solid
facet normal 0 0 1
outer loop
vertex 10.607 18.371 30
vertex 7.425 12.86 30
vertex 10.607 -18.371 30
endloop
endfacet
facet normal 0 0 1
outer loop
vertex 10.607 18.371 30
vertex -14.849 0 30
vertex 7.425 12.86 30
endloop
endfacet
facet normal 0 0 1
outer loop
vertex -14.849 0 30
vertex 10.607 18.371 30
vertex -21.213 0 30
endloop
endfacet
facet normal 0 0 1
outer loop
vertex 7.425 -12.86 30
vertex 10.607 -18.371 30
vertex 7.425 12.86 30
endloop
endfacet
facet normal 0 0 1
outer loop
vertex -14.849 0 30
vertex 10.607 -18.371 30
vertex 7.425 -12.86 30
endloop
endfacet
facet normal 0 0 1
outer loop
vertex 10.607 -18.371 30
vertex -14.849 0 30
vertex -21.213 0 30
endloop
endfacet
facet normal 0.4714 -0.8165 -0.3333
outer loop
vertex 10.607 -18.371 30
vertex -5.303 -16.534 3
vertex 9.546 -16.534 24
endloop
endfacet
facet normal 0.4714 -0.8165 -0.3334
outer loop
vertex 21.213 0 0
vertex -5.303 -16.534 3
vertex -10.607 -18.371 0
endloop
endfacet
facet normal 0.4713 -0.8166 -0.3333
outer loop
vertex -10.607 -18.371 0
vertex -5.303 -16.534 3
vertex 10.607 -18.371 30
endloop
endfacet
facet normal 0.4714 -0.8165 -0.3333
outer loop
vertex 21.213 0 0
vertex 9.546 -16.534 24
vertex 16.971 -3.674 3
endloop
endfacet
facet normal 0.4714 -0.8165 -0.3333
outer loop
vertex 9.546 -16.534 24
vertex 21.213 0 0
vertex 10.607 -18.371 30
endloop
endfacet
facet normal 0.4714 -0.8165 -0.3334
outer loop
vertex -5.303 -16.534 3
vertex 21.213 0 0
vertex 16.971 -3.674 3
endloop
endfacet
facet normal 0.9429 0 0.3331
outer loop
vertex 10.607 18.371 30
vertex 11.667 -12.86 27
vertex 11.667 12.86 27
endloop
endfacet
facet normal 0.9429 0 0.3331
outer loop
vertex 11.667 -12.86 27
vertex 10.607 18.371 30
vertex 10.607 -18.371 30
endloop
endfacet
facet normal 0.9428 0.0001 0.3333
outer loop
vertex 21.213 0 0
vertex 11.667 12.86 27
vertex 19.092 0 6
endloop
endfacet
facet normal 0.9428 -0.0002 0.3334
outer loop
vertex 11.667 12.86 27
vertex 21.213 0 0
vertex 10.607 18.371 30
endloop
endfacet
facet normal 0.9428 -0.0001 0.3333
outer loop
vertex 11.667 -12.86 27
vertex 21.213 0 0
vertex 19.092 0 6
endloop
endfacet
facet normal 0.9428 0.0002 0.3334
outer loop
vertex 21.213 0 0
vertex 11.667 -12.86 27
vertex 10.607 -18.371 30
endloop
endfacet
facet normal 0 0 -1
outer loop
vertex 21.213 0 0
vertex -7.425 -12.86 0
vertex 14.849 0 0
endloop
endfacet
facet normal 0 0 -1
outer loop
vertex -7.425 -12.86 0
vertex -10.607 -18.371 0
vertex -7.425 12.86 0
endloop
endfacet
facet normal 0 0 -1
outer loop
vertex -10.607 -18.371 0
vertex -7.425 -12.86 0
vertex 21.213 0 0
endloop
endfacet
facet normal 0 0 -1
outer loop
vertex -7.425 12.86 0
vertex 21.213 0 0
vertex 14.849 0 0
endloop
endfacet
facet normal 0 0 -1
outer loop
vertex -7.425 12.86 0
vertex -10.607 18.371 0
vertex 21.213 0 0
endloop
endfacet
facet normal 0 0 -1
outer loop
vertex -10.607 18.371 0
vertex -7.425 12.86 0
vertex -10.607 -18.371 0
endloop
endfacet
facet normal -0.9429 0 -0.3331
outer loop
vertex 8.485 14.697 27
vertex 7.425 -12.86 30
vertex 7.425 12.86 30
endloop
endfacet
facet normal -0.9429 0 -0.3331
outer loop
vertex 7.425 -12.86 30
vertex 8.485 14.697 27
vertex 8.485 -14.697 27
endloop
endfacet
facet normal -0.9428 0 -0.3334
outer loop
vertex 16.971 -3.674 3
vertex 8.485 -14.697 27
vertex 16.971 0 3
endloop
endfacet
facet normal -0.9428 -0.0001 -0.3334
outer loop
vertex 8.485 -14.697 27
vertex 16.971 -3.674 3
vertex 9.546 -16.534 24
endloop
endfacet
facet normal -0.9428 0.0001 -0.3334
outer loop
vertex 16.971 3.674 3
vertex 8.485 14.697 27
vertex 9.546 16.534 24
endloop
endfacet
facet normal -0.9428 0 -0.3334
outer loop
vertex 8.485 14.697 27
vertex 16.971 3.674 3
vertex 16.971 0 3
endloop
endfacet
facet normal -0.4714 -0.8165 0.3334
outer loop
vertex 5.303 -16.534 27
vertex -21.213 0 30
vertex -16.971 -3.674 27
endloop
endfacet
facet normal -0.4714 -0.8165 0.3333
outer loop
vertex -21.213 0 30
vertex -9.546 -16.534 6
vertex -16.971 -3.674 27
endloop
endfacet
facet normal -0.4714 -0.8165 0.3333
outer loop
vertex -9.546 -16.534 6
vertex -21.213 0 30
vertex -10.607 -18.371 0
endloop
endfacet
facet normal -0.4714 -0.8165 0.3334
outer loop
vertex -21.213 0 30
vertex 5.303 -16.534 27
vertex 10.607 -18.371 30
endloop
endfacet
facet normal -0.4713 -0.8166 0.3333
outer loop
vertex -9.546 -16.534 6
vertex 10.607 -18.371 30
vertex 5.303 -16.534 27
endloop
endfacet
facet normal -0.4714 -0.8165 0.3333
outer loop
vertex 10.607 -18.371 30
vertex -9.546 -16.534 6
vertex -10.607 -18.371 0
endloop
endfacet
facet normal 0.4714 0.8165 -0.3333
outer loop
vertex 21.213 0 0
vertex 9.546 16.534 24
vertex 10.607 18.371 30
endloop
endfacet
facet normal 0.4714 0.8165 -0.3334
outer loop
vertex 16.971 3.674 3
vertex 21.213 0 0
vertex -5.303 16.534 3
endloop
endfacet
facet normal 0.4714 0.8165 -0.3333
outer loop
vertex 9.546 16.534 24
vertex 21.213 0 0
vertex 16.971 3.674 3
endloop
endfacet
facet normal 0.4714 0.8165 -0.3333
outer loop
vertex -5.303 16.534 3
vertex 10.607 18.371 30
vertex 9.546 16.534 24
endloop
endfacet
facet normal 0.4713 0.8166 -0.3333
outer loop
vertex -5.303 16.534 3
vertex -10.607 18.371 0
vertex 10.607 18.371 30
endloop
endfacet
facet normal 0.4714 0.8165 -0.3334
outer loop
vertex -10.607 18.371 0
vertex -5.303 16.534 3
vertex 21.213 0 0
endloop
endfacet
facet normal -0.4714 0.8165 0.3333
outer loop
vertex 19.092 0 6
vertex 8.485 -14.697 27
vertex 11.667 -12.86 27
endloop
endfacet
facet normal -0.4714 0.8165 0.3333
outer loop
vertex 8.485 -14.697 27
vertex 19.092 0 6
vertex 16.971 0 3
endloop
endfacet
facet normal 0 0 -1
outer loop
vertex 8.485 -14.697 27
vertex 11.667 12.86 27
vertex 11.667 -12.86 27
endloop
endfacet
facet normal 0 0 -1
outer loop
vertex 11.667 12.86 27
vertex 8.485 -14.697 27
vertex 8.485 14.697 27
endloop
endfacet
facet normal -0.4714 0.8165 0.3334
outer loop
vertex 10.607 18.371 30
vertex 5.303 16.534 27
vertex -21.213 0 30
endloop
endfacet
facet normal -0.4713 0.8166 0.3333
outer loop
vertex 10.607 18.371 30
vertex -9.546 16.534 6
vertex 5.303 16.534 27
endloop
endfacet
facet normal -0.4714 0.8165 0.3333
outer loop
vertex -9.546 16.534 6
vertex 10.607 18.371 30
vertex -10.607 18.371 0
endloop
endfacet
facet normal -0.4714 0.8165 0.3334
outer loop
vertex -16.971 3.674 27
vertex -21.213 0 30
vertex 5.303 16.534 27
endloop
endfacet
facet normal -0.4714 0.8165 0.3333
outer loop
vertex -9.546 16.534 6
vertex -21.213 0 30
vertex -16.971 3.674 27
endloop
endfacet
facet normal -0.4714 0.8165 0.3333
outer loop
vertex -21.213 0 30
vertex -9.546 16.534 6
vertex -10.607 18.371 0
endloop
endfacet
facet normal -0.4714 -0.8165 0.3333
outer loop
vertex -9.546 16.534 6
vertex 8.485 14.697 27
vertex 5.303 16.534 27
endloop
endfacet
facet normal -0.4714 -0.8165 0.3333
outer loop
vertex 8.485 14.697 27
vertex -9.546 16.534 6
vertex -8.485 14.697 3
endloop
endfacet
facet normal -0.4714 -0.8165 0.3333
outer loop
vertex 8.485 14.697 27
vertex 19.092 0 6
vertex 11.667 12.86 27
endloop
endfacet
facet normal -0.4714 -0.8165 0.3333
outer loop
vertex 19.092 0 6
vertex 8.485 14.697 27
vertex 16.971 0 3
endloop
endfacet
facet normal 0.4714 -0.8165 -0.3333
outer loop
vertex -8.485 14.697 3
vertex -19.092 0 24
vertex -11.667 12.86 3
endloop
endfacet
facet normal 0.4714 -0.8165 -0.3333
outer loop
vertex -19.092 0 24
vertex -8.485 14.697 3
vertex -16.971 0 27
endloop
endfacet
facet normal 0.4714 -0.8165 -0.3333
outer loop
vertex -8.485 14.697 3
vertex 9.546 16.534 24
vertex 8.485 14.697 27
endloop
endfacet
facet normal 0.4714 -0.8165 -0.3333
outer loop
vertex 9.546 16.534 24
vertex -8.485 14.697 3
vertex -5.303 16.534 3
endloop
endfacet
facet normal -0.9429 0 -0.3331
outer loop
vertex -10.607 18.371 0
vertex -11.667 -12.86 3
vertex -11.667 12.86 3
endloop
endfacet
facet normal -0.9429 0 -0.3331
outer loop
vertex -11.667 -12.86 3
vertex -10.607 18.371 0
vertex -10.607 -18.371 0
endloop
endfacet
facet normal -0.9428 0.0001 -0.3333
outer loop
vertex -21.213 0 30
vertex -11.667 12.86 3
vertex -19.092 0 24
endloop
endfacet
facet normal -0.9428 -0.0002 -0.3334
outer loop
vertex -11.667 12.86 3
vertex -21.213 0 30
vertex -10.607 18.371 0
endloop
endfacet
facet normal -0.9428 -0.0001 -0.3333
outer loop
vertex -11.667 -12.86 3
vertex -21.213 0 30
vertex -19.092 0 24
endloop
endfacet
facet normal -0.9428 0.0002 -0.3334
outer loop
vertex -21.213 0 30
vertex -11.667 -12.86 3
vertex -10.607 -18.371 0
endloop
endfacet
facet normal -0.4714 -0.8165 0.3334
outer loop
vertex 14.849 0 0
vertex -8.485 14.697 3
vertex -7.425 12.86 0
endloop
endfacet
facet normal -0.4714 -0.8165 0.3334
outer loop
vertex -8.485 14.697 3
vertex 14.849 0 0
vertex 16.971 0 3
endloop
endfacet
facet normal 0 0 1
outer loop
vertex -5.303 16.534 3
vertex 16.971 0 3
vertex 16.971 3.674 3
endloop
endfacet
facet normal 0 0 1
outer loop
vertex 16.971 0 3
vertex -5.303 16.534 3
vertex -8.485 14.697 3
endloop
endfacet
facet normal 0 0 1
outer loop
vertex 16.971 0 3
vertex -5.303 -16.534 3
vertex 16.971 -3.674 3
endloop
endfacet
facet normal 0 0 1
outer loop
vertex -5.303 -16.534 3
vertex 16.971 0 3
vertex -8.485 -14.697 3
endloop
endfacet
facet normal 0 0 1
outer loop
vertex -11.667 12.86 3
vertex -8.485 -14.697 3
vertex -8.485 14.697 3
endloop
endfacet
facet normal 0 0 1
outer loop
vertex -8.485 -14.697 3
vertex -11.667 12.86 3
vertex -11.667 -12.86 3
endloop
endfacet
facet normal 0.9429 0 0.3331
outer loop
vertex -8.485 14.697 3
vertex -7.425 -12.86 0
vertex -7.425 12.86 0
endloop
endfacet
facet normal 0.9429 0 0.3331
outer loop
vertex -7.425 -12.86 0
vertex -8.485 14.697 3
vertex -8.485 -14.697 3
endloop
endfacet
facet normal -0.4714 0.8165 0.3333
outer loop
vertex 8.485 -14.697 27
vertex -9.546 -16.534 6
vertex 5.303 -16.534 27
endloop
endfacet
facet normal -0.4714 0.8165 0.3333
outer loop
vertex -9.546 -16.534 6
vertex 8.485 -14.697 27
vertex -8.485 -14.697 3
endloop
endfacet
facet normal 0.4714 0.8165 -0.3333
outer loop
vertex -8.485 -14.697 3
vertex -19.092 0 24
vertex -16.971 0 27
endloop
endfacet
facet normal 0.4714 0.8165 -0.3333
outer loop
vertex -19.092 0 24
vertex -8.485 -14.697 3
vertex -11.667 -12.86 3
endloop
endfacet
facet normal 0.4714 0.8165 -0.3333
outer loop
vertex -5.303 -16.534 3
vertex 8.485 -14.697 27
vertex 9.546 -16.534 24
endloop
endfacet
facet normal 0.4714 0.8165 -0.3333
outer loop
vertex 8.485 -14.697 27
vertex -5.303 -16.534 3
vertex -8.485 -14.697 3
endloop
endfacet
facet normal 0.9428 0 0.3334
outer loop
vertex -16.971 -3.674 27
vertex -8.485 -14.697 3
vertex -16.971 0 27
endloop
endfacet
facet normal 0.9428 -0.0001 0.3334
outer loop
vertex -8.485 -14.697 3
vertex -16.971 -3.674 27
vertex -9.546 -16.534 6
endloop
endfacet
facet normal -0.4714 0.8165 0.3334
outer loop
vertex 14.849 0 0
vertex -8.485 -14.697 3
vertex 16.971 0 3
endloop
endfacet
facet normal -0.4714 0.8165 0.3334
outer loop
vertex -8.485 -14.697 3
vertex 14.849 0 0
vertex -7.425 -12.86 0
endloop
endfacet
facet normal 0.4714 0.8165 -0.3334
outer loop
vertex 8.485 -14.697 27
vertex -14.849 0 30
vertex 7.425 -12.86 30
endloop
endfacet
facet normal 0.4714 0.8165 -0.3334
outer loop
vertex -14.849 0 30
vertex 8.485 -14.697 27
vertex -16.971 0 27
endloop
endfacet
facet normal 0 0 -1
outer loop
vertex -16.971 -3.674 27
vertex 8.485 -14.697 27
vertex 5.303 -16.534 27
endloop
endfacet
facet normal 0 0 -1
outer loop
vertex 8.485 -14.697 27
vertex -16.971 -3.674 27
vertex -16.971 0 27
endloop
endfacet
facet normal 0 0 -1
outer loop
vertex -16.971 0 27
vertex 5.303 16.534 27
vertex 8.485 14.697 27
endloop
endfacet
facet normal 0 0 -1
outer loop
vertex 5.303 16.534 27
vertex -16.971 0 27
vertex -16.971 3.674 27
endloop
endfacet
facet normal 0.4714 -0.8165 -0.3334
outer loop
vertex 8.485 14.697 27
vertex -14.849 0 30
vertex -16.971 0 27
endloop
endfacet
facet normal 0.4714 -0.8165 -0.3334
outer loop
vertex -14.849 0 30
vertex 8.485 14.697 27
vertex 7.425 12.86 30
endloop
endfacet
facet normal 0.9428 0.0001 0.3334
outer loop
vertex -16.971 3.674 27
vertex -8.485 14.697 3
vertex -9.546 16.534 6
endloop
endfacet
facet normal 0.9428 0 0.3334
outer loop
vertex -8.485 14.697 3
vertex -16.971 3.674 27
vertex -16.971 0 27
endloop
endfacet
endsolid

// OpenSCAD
// file: polyhedra.scad
// shape height
//sh = 30;
// border width
//bw = 3;

//poly_wire(octahedron);

function sum0(v, i, r) = i < len(v) ? sum0(v, i + 1, r + v[i]) : r;
function sum(v) = sum0(v, 1, v[0]);
function avg(v) = sum(v) / len(v);

function face_center(poly, fid = 0) =
    let(vs = poly[0])
    let(f = poly[1][fid])
    avg([for (p = f) vs[p]]);
    
function face_dist(poly, fid = 0) =
    norm(face_center(poly, fid));        
    
module face_rotate(poly, fid = 0) {
    c = face_center(poly, fid);
    az = c.x == 0 ? 90 : -atan(c.y / c.x);
    rz = [
        [cos(az), -sin(az), 0],
        [sin(az), cos(az), 0],
        [0, 0, 1],
    ] * c;
    ay = atan(rz.x / rz.z);
    rotate([0, ay, 0]) rotate([0, 0, az])
        children();
}

module poly_fill0(poly, bw = bw, fid = 0) {
    scale(bw / 2 / face_dist(poly, fid)) 
        polyhedron(poly[0], poly[1]);    
}

module poly_wire0(poly, sh = sh, bw = bw, fid = 0) {
    s = (sh - bw) / 2 / face_dist(poly, fid);
    vs = poly[0];
    for (f = poly[1]) {
        n = len(f);
        for (i = [0:n - 1]) {
            j = (i + 1) % n;
            p = f[i];
            q = f[j];
            if (p < q) {
                hull() {
                    translate(vs[p] * s) poly_fill0(poly, bw, fid);
                    translate(vs[q] * s) poly_fill0(poly, bw, fid);
                }                
            }
        }
    }        
}

module poly_wire(poly, sh = sh, bw = bw, fid = 0) {
    translate([0, 0, sh / 2])
        face_rotate(poly, fid)
            poly_wire0(poly, sh, bw, fid);
}

// --------------------- Platonic Solids ---------------------

phi = (sqrt(5) + 1) / 2;

tetrahedron = [[
    [-1, 0, -1/sqrt(2)], // 0
    [1, 0, -1/sqrt(2)], // 1
    [0, -1, 1/sqrt(2)], // 2
    [0, 1, 1/sqrt(2)] // 3
], [
    [0, 1, 3],
    [0, 2, 1],
    [0, 3, 2],
    [1, 2, 3]
]];

cube = [[
    [1, 1, -1], // 0
    [-1, 1, -1], // 1
    [-1, -1, -1], // 2
    [1, -1, -1], // 3
    [1, 1, 1], // 4
    [-1, 1, 1], // 5
    [-1, -1, 1], // 6
    [1, -1, 1], // 7
], [
    [0, 1, 2, 3],
    [0, 4, 5, 1],
    [1, 5, 6, 2],
    [2, 6, 7, 3],
    [3, 7, 4, 0],
    [4, 7, 6, 5]
]];

octahedron = [[
    [0, 0, -1], // 0
    [1, 0, 0], // 1
    [0, 1, 0], // 2
    [-1, 0, 0], // 3
    [0, -1, 0], // 4
    [0, 0, 1] // 5
], [
    [0, 1, 2],
    [0, 2, 3],
    [0, 3, 4],
    [0, 4, 1],
    [5, 2, 1],
    [5, 3, 2],
    [5, 4, 3],
    [5, 1, 4]
]];

dodecahedron = [[
    [-1/phi, 0, -phi], // 0
    [1/phi, 0, -phi], // 1
    [-1, -1, -1], // 2
    [-1, 1, -1], // 3
    [1, -1, -1], // 4
    [1, 1, -1], // 5
    [0, -phi, -1/phi], // 6
    [0, phi, -1/phi], // 7
    [-phi, -1/phi, 0], // 8
    [-phi, 1/phi, 0], // 9
    [phi, -1/phi, 0], // 10
    [phi, 1/phi, 0], // 11
    [0, -phi, 1/phi], // 12
    [0, phi, 1/phi], // 13
    [-1, -1, 1], // 14
    [-1, 1, 1], // 15
    [1, -1, 1], // 16
    [1, 1, 1], // 17
    [-1/phi, 0, phi], // 18
    [1/phi, 0, phi] // 19    
], [
    [0, 1, 5, 7, 3],
    [1, 0, 2, 6, 4],
    [0, 3, 9, 8, 2],
    [1, 4, 10, 11, 5],
    [8, 14, 12, 6, 2],
    [6, 12, 16, 10, 4],
    [7, 13, 15, 9, 3],
    [13, 7, 5, 11, 17],
    [8, 9, 15, 18, 14],
    [11, 10, 16, 19, 17],
    [18, 19, 16, 12, 14],
    [19, 18, 15, 13, 17]
]];

icosahedron = [[
    [0, -1, -phi], // 0
    [0, 1, -phi], // 1
    [-phi, 0, -1], // 2
    [phi, 0, -1], // 3
    [-1, -phi, 0], // 4
    [-1, phi, 0], // 5
    [1, -phi, 0], // 6
    [1, phi, 0], // 7
    [-phi, 0, 1], // 8
    [phi, 0, 1], // 9
    [0, -1, phi], // 10
    [0, 1, phi] // 11    
], [
    [0, 1, 2],
    [1, 0, 3],
    [0, 2, 4],
    [2, 1, 5],
    [1, 3, 7],
    [3, 0, 6],
    [1, 7, 5],
    [0, 4, 6],
    [2, 8, 4],
    [2, 5, 8],
    [3, 6, 9],
    [3, 9, 7],
    [4, 10, 6],
    [5, 7, 11],
    [8, 10, 4],
    [5, 11, 8],
    [9, 11, 7],
    [6, 10, 9],
    [8, 11, 10],
    [9, 10, 11]
]];
// main file
// shape height
sh = 30;
// border width
bw = 3;

include <polyhedra.scad>;

poly_wire(octahedron);
